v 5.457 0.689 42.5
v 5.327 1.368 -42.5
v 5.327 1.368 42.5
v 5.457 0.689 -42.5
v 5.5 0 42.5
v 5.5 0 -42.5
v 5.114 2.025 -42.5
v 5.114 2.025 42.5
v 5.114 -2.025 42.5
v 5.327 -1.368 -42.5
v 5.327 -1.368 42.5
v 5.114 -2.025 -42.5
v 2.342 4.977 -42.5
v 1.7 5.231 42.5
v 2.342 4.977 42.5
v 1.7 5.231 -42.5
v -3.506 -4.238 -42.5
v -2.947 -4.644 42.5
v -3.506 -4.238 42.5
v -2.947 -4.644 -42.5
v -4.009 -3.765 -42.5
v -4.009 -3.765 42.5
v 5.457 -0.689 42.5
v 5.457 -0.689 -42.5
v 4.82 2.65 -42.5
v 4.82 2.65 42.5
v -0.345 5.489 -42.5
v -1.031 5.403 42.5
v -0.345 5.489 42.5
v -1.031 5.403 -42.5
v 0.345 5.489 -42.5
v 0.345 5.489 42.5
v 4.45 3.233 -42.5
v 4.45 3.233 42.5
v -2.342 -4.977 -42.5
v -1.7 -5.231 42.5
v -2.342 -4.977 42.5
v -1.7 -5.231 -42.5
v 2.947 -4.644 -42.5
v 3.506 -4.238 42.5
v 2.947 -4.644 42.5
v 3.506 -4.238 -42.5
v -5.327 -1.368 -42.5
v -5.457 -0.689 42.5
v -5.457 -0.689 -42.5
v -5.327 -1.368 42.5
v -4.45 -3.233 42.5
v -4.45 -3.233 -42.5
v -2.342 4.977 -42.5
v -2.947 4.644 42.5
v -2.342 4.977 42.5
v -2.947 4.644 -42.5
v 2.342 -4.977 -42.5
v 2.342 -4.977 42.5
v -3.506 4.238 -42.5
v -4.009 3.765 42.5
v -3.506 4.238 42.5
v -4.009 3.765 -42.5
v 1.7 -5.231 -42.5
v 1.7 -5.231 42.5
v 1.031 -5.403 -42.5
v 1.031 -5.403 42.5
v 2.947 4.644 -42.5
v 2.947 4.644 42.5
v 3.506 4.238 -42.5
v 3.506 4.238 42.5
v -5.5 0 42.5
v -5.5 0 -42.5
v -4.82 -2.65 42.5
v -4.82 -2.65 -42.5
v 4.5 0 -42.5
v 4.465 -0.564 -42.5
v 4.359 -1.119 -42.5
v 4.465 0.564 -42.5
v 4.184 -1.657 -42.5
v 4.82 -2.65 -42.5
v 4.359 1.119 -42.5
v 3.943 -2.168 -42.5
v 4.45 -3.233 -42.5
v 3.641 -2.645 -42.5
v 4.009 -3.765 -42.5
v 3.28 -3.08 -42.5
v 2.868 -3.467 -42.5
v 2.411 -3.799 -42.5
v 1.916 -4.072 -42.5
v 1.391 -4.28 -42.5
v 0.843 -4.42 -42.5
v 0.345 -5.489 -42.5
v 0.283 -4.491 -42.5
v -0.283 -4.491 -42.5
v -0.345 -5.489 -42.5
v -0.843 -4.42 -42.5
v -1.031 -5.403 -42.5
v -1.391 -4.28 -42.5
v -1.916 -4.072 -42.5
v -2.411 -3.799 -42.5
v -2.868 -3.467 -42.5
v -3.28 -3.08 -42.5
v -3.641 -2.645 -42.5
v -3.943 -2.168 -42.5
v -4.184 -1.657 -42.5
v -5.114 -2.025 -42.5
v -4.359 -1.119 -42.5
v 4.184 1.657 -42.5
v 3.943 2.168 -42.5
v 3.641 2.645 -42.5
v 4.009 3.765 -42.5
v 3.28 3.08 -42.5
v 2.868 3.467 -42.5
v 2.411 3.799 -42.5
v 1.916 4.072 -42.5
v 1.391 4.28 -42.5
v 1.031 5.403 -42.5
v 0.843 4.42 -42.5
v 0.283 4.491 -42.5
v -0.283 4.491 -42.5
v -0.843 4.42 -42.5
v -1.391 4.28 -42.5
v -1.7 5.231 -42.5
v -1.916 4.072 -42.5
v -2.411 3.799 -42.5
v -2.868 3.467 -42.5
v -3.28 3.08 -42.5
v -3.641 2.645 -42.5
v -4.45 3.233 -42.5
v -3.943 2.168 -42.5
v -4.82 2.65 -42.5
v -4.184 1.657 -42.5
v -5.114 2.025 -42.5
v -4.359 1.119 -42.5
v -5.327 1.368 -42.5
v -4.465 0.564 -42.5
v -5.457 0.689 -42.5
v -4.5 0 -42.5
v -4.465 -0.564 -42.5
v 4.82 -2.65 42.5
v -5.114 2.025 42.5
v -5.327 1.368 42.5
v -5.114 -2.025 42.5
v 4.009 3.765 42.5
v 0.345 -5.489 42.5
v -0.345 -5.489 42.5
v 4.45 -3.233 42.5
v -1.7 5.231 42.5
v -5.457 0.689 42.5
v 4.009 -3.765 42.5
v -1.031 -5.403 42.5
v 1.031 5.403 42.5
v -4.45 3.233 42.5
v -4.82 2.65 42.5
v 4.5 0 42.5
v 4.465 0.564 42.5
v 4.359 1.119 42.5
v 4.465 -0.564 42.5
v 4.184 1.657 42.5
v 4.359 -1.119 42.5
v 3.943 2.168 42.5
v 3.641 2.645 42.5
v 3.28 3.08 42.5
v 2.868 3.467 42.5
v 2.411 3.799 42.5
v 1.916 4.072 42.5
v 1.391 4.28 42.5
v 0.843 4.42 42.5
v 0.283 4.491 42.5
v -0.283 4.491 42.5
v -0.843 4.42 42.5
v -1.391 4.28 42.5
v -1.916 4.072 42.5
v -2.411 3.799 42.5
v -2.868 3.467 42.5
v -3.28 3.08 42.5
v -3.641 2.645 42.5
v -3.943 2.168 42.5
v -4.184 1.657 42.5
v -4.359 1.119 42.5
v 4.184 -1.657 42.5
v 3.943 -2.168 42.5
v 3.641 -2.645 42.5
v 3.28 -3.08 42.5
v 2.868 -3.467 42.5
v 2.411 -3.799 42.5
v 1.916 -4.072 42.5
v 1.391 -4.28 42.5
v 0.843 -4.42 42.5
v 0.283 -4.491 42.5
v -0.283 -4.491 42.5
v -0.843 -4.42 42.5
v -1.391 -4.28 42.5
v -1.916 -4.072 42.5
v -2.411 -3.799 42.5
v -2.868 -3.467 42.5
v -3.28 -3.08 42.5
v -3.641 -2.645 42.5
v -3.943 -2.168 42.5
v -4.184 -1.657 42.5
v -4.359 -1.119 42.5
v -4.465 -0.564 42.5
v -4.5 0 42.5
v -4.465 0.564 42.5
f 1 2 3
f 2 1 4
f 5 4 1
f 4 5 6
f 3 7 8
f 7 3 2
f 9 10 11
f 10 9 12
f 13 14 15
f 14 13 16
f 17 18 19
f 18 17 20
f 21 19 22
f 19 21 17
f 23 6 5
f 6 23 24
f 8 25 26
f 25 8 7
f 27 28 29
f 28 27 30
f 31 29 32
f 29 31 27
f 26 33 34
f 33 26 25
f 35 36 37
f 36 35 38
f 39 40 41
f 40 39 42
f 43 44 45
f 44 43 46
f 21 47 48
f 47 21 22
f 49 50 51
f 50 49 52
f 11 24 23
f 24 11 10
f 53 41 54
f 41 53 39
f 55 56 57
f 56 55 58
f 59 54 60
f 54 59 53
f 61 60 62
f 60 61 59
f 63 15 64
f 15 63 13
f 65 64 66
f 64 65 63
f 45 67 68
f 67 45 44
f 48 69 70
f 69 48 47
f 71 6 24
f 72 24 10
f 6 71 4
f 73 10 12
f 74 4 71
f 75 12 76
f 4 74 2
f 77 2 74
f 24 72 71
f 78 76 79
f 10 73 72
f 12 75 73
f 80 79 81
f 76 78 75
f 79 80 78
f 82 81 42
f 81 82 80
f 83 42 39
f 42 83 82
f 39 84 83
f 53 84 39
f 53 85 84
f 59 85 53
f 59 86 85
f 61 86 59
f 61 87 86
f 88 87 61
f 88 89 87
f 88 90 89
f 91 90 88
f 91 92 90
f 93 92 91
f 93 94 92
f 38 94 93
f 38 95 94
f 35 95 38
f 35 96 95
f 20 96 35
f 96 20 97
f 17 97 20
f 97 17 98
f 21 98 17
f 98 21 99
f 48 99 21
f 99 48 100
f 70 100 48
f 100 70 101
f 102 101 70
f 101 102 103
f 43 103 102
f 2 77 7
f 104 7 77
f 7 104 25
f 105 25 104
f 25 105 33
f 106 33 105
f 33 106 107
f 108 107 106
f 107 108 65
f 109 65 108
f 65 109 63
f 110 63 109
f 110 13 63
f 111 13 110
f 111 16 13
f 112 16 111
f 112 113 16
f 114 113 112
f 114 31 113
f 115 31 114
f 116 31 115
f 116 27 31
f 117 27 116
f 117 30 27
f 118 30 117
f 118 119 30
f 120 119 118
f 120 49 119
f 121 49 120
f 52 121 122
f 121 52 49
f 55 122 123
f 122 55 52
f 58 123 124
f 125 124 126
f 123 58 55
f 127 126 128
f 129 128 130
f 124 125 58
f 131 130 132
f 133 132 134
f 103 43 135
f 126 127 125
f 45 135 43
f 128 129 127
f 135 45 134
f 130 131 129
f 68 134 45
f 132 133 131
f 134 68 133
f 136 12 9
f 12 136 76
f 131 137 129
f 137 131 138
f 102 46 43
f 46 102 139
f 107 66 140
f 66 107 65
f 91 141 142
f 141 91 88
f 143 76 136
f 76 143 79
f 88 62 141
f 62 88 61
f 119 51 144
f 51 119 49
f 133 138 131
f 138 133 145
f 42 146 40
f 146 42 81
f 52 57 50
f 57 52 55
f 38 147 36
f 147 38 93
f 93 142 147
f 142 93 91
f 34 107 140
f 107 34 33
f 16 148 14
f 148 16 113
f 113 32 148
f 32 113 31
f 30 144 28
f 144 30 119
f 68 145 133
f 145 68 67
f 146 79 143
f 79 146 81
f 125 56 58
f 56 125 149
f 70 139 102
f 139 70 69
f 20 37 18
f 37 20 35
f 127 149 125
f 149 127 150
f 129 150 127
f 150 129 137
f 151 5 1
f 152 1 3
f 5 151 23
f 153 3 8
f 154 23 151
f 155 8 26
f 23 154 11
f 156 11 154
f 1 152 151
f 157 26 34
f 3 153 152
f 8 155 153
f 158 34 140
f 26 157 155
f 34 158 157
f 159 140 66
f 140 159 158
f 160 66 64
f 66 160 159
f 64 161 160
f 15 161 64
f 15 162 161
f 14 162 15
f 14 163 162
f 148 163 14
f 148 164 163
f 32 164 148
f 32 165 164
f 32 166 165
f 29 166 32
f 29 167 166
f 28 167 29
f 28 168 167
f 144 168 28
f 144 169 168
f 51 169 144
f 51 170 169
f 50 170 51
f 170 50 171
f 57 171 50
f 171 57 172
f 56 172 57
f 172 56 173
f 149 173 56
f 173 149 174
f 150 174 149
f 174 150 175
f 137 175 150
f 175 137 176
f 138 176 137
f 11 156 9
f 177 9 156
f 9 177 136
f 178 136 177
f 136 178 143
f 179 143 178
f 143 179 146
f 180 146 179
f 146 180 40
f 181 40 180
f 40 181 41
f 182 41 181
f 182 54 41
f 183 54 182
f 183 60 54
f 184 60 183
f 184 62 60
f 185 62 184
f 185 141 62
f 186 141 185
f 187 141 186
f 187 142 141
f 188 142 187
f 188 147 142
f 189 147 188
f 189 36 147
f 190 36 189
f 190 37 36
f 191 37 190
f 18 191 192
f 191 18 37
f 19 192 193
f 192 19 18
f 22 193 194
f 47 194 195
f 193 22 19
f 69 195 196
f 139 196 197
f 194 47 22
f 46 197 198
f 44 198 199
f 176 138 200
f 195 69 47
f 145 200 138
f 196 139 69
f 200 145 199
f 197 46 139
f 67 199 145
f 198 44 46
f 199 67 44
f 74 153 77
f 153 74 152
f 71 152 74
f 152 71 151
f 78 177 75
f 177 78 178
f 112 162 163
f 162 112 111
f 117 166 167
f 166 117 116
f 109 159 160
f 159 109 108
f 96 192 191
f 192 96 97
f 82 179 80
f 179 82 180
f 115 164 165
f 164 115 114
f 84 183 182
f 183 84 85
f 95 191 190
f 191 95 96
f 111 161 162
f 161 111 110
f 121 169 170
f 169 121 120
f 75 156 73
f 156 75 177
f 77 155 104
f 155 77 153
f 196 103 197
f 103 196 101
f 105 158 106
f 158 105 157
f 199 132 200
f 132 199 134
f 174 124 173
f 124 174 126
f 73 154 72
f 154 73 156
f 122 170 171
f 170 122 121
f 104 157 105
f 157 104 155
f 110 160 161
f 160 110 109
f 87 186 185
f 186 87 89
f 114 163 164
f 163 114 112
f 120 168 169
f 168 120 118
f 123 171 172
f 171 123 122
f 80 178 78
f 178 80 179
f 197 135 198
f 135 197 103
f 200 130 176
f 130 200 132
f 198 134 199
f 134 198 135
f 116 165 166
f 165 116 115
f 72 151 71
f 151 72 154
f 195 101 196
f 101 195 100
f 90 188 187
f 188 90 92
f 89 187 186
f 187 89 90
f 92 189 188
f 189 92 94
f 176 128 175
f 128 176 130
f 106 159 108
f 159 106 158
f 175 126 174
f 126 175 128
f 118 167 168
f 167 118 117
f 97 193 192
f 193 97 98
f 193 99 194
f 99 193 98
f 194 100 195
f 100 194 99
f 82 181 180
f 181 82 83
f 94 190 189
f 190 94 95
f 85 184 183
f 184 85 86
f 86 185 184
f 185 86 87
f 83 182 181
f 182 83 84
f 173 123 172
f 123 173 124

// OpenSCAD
$fn = 50;


difference() {
	union() {
		translate(v = [0, 0, -42.5000000000]) {
			cylinder(h = 85, r = 5.5000000000);
		}
	}
	union() {
		translate(v = [0, 0, -100.0000000000]) {
			cylinder(h = 200, r = 4.5000000000);
		}
	}
}
